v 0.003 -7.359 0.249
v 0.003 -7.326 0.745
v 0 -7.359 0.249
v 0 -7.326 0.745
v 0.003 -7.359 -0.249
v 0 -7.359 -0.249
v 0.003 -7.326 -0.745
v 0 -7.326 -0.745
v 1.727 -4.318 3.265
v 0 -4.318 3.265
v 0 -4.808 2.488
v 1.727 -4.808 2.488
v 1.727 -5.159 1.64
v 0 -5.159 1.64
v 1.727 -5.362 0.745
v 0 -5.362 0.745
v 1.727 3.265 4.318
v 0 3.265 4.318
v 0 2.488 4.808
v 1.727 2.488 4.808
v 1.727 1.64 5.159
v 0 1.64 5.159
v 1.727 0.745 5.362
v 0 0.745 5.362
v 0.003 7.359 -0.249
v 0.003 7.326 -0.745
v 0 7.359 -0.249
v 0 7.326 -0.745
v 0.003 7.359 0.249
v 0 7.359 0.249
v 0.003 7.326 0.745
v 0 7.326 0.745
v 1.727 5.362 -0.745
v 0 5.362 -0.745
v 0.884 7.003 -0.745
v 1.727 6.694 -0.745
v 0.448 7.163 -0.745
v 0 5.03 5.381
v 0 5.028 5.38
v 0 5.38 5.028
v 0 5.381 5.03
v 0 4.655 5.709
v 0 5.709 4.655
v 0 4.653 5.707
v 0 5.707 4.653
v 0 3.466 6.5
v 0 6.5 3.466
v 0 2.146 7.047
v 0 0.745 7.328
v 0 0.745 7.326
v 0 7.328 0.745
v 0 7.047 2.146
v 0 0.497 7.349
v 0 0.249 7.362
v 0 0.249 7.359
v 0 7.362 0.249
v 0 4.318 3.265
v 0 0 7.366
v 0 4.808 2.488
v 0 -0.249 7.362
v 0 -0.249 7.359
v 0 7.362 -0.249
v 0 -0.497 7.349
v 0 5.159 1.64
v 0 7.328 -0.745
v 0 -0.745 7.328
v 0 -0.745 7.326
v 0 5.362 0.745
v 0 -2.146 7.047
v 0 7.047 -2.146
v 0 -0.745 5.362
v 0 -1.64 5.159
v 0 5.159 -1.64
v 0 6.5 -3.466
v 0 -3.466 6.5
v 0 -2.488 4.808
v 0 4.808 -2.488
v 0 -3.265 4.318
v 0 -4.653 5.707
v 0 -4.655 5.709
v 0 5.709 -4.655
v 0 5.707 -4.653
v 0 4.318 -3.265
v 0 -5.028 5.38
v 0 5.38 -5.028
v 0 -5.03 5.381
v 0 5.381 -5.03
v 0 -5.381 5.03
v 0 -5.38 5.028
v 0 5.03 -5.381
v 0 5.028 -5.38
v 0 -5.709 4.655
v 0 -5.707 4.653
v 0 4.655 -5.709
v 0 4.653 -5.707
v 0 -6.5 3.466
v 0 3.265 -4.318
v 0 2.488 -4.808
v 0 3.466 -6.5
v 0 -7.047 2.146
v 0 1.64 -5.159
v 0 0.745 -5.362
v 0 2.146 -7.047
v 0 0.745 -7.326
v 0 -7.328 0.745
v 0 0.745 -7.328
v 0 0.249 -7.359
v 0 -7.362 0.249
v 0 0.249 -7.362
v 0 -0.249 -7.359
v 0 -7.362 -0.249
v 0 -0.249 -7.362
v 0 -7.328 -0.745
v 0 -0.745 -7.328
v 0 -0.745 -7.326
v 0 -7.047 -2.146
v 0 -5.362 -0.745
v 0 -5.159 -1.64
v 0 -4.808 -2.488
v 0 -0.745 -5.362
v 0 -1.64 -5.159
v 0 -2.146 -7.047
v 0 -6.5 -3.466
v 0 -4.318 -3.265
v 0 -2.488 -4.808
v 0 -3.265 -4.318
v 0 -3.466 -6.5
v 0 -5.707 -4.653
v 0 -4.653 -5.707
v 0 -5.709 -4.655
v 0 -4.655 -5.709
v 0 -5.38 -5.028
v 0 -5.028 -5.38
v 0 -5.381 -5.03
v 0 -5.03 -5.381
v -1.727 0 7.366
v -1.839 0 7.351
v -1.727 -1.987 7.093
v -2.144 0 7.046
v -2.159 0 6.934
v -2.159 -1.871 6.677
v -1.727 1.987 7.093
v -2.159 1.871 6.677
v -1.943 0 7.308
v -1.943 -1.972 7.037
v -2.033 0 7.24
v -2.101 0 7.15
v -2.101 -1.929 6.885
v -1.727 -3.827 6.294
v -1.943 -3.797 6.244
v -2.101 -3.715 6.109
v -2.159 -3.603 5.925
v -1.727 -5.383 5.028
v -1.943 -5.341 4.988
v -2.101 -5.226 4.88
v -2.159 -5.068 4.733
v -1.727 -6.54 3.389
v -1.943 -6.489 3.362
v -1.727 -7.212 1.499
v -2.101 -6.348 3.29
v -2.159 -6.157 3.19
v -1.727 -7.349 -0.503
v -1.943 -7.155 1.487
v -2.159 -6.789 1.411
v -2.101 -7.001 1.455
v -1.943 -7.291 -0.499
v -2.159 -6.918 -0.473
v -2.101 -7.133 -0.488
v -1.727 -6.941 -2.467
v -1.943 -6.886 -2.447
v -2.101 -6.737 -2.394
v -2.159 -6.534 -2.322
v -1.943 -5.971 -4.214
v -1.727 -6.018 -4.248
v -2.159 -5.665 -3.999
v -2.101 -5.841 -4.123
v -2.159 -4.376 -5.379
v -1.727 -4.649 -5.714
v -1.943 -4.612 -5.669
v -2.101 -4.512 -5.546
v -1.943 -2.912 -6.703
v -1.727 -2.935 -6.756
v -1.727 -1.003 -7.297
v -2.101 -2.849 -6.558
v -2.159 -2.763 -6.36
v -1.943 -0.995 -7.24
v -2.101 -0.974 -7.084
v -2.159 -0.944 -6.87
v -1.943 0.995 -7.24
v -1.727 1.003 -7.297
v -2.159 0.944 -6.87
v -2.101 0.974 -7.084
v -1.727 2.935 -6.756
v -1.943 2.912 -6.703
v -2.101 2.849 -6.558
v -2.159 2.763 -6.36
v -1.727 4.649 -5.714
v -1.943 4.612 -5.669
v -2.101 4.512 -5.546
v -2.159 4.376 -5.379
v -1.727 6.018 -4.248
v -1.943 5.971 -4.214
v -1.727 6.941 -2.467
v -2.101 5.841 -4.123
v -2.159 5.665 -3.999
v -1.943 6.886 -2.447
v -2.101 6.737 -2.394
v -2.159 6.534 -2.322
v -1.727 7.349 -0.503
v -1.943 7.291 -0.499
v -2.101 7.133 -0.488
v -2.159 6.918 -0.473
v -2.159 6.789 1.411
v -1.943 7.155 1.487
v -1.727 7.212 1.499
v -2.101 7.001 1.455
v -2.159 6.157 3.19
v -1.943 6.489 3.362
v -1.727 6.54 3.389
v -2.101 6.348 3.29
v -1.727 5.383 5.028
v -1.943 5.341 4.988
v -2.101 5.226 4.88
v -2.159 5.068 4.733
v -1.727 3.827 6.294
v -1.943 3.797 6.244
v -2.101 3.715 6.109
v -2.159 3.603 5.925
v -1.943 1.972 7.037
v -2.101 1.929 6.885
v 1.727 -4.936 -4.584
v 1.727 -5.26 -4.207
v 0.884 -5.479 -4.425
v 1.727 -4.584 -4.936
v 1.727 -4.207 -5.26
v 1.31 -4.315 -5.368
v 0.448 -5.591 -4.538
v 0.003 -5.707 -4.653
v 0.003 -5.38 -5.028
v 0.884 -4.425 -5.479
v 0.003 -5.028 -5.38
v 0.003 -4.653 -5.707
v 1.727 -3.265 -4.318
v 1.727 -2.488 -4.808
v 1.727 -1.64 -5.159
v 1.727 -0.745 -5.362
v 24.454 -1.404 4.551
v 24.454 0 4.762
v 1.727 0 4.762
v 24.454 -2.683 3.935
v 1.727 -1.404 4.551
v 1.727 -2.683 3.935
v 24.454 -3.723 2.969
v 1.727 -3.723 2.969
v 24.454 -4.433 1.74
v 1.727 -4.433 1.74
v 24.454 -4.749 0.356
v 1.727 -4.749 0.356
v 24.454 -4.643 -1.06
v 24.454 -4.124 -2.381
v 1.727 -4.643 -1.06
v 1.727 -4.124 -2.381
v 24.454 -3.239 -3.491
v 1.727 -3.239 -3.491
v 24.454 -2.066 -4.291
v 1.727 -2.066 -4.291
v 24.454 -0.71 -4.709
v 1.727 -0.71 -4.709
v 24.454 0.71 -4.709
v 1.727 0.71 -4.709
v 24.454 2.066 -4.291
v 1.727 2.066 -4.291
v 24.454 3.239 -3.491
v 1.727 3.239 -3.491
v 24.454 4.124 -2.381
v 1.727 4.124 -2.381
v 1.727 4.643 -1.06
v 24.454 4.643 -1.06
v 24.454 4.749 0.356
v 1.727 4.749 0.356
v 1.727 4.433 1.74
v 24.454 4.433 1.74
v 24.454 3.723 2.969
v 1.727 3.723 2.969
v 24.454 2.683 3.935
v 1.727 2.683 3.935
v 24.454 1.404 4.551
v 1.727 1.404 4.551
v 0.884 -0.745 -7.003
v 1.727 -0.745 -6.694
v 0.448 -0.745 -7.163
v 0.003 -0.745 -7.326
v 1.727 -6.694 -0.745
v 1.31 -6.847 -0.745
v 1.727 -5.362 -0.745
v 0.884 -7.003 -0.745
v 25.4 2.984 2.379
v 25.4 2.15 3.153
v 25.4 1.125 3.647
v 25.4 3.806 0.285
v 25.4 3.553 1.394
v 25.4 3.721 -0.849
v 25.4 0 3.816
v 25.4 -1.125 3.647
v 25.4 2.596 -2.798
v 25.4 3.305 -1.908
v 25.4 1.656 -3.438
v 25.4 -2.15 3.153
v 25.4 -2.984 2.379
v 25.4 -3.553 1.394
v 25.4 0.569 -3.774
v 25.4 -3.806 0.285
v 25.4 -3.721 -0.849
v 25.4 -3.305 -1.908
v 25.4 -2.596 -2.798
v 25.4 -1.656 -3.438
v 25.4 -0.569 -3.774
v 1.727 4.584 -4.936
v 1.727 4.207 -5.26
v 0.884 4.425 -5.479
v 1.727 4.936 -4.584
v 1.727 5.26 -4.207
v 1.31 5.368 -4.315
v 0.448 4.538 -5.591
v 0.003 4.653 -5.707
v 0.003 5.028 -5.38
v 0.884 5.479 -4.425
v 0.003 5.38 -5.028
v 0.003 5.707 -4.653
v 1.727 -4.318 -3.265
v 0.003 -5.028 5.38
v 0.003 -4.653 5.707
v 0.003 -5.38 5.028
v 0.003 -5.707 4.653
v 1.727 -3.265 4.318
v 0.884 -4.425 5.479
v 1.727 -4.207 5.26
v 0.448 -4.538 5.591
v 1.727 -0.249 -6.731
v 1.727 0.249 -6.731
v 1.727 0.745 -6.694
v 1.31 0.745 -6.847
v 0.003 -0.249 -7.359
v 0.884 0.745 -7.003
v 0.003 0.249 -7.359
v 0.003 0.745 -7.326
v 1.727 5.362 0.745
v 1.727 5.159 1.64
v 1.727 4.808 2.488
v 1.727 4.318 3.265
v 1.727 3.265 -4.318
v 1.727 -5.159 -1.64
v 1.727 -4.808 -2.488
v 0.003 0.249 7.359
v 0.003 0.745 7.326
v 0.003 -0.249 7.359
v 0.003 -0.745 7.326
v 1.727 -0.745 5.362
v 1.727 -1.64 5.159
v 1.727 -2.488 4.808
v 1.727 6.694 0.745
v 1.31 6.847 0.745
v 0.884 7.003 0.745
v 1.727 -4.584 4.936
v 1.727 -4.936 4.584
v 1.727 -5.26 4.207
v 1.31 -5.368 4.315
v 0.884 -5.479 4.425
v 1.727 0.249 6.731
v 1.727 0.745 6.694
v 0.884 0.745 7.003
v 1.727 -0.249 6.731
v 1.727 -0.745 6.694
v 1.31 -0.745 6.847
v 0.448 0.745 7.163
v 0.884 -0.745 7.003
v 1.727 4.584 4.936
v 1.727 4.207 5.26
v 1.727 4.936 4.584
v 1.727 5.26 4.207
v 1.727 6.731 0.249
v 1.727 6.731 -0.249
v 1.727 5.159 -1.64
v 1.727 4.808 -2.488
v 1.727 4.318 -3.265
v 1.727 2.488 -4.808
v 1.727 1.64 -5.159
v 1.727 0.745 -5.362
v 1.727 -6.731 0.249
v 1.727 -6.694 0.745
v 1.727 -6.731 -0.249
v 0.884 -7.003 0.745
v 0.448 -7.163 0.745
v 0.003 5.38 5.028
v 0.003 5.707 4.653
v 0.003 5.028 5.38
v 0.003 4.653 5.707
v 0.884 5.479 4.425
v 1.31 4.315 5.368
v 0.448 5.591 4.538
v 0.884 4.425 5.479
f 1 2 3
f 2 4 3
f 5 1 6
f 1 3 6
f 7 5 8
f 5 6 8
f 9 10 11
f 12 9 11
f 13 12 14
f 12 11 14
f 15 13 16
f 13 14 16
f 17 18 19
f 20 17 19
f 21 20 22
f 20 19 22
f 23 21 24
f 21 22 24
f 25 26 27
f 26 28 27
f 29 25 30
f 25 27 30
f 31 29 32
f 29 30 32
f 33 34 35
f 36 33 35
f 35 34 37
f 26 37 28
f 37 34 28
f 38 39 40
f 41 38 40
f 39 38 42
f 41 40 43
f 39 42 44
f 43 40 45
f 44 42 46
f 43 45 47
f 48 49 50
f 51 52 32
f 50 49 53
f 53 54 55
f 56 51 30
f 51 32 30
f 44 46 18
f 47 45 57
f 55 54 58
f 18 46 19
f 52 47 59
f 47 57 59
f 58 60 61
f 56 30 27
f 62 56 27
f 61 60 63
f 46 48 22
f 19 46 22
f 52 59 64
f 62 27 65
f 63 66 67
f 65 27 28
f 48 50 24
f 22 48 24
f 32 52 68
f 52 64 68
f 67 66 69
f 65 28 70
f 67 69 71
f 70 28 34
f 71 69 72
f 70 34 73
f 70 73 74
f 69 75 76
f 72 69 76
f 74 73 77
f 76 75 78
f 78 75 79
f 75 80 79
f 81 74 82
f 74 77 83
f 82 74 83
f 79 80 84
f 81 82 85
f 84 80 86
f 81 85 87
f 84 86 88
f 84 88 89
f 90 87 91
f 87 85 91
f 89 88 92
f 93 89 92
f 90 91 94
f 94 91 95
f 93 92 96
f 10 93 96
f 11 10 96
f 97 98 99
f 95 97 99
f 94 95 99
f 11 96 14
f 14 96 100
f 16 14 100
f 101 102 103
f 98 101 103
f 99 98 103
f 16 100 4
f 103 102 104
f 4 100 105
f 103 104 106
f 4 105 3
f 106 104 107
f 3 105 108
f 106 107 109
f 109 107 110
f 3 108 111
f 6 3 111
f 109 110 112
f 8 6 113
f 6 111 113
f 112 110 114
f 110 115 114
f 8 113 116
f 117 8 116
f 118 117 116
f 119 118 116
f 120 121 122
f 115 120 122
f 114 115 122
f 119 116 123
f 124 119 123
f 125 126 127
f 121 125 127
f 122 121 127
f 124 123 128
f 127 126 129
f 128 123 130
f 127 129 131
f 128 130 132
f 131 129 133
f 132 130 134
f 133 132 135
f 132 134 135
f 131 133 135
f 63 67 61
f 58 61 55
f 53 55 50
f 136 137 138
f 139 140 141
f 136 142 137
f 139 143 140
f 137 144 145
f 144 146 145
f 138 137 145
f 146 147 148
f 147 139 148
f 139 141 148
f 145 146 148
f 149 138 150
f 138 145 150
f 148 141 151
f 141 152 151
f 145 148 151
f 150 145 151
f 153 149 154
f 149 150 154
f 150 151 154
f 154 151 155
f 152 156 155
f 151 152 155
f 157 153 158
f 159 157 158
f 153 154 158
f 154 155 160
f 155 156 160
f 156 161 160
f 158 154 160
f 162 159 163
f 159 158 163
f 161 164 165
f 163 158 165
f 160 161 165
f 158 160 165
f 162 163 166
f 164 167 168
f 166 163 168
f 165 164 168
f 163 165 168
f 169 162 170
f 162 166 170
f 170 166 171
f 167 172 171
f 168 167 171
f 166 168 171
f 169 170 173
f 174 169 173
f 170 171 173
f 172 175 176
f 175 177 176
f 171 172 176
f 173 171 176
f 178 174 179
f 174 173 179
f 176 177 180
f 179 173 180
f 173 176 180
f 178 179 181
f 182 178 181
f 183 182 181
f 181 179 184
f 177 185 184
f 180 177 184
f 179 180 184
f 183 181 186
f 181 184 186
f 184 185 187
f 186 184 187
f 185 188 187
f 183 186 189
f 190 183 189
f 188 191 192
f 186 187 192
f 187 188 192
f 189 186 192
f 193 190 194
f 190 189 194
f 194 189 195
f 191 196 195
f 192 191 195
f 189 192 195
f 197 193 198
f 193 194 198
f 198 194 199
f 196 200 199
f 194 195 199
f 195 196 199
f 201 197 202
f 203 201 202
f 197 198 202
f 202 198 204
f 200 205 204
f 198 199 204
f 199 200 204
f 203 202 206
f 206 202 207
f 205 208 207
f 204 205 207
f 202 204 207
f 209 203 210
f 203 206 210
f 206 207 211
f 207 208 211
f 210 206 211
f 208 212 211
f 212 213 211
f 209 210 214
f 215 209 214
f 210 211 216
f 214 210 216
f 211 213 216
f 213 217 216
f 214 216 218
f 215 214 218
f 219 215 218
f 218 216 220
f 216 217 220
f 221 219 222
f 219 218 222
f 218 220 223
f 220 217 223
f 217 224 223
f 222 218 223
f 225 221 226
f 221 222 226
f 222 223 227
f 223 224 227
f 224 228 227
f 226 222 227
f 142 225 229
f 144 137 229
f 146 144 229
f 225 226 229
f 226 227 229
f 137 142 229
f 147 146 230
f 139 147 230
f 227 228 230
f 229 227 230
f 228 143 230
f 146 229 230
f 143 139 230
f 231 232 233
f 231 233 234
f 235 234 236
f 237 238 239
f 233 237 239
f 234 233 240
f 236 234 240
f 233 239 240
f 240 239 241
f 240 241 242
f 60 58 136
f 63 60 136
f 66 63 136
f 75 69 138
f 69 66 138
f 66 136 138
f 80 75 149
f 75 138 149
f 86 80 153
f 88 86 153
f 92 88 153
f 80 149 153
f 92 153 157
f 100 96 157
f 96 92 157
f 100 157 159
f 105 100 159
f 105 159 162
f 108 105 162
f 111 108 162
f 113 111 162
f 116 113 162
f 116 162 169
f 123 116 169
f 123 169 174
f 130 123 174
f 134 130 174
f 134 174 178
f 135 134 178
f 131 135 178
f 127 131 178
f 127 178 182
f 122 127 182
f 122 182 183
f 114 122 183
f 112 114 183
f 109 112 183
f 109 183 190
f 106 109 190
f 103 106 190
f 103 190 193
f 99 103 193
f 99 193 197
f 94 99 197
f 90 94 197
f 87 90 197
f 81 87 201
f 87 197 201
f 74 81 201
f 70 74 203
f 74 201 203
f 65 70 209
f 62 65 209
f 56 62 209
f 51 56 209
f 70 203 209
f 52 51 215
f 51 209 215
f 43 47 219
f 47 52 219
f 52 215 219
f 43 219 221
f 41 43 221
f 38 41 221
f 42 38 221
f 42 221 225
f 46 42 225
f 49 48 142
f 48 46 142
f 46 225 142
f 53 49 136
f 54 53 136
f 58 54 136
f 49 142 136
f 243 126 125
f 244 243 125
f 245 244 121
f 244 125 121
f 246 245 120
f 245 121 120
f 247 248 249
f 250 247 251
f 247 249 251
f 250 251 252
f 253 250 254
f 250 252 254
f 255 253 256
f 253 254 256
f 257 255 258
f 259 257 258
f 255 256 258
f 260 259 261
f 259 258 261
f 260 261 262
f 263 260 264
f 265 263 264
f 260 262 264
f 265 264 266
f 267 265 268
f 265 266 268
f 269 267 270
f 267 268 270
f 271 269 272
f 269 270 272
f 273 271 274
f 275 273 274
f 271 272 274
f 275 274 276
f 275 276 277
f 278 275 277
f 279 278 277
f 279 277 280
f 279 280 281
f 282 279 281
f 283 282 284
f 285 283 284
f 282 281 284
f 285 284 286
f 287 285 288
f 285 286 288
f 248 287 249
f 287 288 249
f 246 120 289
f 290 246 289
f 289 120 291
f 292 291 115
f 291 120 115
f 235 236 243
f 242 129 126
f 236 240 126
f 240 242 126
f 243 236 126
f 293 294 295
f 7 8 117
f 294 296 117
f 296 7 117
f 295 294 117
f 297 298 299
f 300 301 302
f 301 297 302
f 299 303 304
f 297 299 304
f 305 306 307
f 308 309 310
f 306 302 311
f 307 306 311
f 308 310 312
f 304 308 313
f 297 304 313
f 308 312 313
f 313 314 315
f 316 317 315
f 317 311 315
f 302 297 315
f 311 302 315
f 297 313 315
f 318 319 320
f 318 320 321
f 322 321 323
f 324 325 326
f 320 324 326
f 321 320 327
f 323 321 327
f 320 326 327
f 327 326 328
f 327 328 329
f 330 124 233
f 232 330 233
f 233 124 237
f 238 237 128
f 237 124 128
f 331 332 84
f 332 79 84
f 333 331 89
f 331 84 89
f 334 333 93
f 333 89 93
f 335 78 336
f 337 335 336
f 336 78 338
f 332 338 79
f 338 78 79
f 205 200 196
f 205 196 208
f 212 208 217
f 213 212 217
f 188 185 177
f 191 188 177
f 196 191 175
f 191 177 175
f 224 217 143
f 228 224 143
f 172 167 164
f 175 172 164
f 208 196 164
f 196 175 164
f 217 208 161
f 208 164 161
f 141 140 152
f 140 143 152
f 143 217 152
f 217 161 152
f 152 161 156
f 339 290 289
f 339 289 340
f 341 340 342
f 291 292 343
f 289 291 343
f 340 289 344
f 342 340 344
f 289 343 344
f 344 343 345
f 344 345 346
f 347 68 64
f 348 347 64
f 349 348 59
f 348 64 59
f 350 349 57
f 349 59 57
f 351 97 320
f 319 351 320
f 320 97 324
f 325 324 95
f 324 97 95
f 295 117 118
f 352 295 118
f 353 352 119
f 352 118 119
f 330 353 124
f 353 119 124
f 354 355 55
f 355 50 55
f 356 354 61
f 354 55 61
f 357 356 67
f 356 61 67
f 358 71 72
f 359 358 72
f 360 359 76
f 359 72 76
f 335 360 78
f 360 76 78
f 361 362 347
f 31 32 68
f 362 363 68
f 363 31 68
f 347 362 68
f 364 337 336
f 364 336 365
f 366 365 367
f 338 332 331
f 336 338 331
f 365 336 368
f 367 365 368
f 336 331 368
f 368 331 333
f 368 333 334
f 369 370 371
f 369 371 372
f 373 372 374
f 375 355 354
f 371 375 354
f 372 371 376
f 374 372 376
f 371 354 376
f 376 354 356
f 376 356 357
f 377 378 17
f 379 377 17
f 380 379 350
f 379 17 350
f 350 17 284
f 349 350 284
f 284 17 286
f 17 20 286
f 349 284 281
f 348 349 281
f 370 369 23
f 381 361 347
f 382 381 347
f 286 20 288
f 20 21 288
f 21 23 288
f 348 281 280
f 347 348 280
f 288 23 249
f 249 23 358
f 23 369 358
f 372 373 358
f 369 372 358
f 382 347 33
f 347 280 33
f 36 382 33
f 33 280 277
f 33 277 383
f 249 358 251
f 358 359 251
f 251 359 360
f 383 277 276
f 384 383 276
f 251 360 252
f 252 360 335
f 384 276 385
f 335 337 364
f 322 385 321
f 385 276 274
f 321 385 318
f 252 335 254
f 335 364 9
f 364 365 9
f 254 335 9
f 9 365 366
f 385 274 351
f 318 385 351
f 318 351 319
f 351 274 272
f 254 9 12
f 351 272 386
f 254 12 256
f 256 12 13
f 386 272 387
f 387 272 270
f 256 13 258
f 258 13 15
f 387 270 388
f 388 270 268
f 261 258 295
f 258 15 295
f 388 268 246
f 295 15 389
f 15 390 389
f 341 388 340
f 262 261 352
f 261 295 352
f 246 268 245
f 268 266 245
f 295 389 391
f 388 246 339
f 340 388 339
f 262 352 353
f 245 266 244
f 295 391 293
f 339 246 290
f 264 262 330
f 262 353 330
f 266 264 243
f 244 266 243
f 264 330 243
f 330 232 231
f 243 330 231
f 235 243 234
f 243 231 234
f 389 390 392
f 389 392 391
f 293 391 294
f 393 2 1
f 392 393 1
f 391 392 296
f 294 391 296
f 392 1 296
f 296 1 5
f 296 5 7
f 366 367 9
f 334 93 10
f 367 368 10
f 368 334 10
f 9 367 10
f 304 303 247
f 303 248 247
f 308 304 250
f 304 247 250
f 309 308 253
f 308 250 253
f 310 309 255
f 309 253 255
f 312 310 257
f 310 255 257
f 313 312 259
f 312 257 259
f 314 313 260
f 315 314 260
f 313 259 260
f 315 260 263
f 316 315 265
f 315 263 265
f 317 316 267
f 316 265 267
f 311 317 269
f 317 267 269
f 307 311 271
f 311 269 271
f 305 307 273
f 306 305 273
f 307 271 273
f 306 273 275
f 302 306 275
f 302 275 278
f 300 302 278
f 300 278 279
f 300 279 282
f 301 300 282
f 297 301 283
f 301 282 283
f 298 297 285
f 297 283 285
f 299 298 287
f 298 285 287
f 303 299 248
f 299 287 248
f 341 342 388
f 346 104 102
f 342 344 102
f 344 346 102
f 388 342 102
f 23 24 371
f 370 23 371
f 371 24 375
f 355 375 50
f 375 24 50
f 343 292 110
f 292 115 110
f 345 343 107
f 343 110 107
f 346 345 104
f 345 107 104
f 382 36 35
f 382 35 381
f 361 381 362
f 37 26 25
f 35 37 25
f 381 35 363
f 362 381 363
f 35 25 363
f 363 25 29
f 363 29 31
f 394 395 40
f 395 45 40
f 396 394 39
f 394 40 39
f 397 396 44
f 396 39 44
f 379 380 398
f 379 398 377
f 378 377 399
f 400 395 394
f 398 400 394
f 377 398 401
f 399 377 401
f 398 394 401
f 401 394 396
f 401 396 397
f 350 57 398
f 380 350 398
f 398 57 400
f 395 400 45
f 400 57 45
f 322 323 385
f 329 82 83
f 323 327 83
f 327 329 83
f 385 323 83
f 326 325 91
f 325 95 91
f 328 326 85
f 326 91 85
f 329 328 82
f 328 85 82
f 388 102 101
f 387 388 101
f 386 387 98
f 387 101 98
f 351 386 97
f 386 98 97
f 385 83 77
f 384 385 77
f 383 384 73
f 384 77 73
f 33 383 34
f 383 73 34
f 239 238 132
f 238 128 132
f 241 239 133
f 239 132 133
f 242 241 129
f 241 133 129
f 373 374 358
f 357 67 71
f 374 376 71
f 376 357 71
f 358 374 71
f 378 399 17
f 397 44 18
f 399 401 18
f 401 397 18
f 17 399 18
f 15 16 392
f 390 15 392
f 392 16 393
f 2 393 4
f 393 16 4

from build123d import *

# Parameters (mm, degrees)
RIBCUT_START     = -1.7272
RIBCUT_DEPTH     = 1.7272
RIBCUTSPAT_COUNT = 8
RIBCUTSPAT_ANGLE = 315


with BuildPart() as part:
    # BodySke → BaseBody (revolve)
    with BuildSketch(Plane.XY, mode=Mode.PRIVATE) as basebody_sk:
        with BuildLine():
            Line((-2.159, 6.9342), (-2.159, 0))
            Line((-2.159, 0), (25.4, 0))
            Line((25.4, 0), (25.4, 3.81635))
            Line((25.4, 3.81635), (24.45385, 4.7625))
            Line((24.45385, 4.7625), (1.7272, 4.7625))
            Line((1.7272, 4.7625), (1.7272, 6.735735096))
            Line((1.7272, 6.735735096), (0.00254, 7.36346))
            Line((0.00254, 7.36346), (0, 7.36346))
            Line((0, 7.36346), (0, 7.366))
            Line((0, 7.366), (-1.7272, 7.366))
            ThreePointArc((-1.7272, 7.366), (-2.032528708, 7.239528708), (-2.159, 6.9342))
        make_face()
    revolve(basebody_sk.sketch.rotate(Axis((0, 0, 0), (1, 0, 0)), 90), axis=Axis((0, 0, 0), (1, 0, 0)))

    # RibCutSke → RibCut (cut)
    with BuildSketch(Plane(origin=(1.7272, 1.794401132, -0.090952894), x_dir=(0, 0, -1), z_dir=(1, 0, 0)).offset(RIBCUT_START)):
        with BuildLine():
            Line((0.654066246, 3.567461918), (0.654066246, 5.533825289))
            ThreePointArc((0.654066246, 5.533825289), (2.727893269, 5.010895504), (4.564077617, 3.91424555))
            Line((4.564077617, 3.91424555), (3.173648743, 2.523816676))
            ThreePointArc((3.173648743, 2.523816676), (1.980656032, 3.206905232), (0.654066246, 3.567461918))
        make_face()
    ribcut = extrude(amount=RIBCUT_DEPTH, mode=Mode.SUBTRACT)

    # RibCutsPat: RibCut ×8 about axis
    ribcutspat_axis = Axis((0, 0, 0), (1, 0, 0))
    for i in range(1, RIBCUTSPAT_COUNT):
        add(ribcut.rotate(ribcutspat_axis, i * RIBCUTSPAT_ANGLE / (RIBCUTSPAT_COUNT - 1)), mode=Mode.SUBTRACT)


solid = part.part
